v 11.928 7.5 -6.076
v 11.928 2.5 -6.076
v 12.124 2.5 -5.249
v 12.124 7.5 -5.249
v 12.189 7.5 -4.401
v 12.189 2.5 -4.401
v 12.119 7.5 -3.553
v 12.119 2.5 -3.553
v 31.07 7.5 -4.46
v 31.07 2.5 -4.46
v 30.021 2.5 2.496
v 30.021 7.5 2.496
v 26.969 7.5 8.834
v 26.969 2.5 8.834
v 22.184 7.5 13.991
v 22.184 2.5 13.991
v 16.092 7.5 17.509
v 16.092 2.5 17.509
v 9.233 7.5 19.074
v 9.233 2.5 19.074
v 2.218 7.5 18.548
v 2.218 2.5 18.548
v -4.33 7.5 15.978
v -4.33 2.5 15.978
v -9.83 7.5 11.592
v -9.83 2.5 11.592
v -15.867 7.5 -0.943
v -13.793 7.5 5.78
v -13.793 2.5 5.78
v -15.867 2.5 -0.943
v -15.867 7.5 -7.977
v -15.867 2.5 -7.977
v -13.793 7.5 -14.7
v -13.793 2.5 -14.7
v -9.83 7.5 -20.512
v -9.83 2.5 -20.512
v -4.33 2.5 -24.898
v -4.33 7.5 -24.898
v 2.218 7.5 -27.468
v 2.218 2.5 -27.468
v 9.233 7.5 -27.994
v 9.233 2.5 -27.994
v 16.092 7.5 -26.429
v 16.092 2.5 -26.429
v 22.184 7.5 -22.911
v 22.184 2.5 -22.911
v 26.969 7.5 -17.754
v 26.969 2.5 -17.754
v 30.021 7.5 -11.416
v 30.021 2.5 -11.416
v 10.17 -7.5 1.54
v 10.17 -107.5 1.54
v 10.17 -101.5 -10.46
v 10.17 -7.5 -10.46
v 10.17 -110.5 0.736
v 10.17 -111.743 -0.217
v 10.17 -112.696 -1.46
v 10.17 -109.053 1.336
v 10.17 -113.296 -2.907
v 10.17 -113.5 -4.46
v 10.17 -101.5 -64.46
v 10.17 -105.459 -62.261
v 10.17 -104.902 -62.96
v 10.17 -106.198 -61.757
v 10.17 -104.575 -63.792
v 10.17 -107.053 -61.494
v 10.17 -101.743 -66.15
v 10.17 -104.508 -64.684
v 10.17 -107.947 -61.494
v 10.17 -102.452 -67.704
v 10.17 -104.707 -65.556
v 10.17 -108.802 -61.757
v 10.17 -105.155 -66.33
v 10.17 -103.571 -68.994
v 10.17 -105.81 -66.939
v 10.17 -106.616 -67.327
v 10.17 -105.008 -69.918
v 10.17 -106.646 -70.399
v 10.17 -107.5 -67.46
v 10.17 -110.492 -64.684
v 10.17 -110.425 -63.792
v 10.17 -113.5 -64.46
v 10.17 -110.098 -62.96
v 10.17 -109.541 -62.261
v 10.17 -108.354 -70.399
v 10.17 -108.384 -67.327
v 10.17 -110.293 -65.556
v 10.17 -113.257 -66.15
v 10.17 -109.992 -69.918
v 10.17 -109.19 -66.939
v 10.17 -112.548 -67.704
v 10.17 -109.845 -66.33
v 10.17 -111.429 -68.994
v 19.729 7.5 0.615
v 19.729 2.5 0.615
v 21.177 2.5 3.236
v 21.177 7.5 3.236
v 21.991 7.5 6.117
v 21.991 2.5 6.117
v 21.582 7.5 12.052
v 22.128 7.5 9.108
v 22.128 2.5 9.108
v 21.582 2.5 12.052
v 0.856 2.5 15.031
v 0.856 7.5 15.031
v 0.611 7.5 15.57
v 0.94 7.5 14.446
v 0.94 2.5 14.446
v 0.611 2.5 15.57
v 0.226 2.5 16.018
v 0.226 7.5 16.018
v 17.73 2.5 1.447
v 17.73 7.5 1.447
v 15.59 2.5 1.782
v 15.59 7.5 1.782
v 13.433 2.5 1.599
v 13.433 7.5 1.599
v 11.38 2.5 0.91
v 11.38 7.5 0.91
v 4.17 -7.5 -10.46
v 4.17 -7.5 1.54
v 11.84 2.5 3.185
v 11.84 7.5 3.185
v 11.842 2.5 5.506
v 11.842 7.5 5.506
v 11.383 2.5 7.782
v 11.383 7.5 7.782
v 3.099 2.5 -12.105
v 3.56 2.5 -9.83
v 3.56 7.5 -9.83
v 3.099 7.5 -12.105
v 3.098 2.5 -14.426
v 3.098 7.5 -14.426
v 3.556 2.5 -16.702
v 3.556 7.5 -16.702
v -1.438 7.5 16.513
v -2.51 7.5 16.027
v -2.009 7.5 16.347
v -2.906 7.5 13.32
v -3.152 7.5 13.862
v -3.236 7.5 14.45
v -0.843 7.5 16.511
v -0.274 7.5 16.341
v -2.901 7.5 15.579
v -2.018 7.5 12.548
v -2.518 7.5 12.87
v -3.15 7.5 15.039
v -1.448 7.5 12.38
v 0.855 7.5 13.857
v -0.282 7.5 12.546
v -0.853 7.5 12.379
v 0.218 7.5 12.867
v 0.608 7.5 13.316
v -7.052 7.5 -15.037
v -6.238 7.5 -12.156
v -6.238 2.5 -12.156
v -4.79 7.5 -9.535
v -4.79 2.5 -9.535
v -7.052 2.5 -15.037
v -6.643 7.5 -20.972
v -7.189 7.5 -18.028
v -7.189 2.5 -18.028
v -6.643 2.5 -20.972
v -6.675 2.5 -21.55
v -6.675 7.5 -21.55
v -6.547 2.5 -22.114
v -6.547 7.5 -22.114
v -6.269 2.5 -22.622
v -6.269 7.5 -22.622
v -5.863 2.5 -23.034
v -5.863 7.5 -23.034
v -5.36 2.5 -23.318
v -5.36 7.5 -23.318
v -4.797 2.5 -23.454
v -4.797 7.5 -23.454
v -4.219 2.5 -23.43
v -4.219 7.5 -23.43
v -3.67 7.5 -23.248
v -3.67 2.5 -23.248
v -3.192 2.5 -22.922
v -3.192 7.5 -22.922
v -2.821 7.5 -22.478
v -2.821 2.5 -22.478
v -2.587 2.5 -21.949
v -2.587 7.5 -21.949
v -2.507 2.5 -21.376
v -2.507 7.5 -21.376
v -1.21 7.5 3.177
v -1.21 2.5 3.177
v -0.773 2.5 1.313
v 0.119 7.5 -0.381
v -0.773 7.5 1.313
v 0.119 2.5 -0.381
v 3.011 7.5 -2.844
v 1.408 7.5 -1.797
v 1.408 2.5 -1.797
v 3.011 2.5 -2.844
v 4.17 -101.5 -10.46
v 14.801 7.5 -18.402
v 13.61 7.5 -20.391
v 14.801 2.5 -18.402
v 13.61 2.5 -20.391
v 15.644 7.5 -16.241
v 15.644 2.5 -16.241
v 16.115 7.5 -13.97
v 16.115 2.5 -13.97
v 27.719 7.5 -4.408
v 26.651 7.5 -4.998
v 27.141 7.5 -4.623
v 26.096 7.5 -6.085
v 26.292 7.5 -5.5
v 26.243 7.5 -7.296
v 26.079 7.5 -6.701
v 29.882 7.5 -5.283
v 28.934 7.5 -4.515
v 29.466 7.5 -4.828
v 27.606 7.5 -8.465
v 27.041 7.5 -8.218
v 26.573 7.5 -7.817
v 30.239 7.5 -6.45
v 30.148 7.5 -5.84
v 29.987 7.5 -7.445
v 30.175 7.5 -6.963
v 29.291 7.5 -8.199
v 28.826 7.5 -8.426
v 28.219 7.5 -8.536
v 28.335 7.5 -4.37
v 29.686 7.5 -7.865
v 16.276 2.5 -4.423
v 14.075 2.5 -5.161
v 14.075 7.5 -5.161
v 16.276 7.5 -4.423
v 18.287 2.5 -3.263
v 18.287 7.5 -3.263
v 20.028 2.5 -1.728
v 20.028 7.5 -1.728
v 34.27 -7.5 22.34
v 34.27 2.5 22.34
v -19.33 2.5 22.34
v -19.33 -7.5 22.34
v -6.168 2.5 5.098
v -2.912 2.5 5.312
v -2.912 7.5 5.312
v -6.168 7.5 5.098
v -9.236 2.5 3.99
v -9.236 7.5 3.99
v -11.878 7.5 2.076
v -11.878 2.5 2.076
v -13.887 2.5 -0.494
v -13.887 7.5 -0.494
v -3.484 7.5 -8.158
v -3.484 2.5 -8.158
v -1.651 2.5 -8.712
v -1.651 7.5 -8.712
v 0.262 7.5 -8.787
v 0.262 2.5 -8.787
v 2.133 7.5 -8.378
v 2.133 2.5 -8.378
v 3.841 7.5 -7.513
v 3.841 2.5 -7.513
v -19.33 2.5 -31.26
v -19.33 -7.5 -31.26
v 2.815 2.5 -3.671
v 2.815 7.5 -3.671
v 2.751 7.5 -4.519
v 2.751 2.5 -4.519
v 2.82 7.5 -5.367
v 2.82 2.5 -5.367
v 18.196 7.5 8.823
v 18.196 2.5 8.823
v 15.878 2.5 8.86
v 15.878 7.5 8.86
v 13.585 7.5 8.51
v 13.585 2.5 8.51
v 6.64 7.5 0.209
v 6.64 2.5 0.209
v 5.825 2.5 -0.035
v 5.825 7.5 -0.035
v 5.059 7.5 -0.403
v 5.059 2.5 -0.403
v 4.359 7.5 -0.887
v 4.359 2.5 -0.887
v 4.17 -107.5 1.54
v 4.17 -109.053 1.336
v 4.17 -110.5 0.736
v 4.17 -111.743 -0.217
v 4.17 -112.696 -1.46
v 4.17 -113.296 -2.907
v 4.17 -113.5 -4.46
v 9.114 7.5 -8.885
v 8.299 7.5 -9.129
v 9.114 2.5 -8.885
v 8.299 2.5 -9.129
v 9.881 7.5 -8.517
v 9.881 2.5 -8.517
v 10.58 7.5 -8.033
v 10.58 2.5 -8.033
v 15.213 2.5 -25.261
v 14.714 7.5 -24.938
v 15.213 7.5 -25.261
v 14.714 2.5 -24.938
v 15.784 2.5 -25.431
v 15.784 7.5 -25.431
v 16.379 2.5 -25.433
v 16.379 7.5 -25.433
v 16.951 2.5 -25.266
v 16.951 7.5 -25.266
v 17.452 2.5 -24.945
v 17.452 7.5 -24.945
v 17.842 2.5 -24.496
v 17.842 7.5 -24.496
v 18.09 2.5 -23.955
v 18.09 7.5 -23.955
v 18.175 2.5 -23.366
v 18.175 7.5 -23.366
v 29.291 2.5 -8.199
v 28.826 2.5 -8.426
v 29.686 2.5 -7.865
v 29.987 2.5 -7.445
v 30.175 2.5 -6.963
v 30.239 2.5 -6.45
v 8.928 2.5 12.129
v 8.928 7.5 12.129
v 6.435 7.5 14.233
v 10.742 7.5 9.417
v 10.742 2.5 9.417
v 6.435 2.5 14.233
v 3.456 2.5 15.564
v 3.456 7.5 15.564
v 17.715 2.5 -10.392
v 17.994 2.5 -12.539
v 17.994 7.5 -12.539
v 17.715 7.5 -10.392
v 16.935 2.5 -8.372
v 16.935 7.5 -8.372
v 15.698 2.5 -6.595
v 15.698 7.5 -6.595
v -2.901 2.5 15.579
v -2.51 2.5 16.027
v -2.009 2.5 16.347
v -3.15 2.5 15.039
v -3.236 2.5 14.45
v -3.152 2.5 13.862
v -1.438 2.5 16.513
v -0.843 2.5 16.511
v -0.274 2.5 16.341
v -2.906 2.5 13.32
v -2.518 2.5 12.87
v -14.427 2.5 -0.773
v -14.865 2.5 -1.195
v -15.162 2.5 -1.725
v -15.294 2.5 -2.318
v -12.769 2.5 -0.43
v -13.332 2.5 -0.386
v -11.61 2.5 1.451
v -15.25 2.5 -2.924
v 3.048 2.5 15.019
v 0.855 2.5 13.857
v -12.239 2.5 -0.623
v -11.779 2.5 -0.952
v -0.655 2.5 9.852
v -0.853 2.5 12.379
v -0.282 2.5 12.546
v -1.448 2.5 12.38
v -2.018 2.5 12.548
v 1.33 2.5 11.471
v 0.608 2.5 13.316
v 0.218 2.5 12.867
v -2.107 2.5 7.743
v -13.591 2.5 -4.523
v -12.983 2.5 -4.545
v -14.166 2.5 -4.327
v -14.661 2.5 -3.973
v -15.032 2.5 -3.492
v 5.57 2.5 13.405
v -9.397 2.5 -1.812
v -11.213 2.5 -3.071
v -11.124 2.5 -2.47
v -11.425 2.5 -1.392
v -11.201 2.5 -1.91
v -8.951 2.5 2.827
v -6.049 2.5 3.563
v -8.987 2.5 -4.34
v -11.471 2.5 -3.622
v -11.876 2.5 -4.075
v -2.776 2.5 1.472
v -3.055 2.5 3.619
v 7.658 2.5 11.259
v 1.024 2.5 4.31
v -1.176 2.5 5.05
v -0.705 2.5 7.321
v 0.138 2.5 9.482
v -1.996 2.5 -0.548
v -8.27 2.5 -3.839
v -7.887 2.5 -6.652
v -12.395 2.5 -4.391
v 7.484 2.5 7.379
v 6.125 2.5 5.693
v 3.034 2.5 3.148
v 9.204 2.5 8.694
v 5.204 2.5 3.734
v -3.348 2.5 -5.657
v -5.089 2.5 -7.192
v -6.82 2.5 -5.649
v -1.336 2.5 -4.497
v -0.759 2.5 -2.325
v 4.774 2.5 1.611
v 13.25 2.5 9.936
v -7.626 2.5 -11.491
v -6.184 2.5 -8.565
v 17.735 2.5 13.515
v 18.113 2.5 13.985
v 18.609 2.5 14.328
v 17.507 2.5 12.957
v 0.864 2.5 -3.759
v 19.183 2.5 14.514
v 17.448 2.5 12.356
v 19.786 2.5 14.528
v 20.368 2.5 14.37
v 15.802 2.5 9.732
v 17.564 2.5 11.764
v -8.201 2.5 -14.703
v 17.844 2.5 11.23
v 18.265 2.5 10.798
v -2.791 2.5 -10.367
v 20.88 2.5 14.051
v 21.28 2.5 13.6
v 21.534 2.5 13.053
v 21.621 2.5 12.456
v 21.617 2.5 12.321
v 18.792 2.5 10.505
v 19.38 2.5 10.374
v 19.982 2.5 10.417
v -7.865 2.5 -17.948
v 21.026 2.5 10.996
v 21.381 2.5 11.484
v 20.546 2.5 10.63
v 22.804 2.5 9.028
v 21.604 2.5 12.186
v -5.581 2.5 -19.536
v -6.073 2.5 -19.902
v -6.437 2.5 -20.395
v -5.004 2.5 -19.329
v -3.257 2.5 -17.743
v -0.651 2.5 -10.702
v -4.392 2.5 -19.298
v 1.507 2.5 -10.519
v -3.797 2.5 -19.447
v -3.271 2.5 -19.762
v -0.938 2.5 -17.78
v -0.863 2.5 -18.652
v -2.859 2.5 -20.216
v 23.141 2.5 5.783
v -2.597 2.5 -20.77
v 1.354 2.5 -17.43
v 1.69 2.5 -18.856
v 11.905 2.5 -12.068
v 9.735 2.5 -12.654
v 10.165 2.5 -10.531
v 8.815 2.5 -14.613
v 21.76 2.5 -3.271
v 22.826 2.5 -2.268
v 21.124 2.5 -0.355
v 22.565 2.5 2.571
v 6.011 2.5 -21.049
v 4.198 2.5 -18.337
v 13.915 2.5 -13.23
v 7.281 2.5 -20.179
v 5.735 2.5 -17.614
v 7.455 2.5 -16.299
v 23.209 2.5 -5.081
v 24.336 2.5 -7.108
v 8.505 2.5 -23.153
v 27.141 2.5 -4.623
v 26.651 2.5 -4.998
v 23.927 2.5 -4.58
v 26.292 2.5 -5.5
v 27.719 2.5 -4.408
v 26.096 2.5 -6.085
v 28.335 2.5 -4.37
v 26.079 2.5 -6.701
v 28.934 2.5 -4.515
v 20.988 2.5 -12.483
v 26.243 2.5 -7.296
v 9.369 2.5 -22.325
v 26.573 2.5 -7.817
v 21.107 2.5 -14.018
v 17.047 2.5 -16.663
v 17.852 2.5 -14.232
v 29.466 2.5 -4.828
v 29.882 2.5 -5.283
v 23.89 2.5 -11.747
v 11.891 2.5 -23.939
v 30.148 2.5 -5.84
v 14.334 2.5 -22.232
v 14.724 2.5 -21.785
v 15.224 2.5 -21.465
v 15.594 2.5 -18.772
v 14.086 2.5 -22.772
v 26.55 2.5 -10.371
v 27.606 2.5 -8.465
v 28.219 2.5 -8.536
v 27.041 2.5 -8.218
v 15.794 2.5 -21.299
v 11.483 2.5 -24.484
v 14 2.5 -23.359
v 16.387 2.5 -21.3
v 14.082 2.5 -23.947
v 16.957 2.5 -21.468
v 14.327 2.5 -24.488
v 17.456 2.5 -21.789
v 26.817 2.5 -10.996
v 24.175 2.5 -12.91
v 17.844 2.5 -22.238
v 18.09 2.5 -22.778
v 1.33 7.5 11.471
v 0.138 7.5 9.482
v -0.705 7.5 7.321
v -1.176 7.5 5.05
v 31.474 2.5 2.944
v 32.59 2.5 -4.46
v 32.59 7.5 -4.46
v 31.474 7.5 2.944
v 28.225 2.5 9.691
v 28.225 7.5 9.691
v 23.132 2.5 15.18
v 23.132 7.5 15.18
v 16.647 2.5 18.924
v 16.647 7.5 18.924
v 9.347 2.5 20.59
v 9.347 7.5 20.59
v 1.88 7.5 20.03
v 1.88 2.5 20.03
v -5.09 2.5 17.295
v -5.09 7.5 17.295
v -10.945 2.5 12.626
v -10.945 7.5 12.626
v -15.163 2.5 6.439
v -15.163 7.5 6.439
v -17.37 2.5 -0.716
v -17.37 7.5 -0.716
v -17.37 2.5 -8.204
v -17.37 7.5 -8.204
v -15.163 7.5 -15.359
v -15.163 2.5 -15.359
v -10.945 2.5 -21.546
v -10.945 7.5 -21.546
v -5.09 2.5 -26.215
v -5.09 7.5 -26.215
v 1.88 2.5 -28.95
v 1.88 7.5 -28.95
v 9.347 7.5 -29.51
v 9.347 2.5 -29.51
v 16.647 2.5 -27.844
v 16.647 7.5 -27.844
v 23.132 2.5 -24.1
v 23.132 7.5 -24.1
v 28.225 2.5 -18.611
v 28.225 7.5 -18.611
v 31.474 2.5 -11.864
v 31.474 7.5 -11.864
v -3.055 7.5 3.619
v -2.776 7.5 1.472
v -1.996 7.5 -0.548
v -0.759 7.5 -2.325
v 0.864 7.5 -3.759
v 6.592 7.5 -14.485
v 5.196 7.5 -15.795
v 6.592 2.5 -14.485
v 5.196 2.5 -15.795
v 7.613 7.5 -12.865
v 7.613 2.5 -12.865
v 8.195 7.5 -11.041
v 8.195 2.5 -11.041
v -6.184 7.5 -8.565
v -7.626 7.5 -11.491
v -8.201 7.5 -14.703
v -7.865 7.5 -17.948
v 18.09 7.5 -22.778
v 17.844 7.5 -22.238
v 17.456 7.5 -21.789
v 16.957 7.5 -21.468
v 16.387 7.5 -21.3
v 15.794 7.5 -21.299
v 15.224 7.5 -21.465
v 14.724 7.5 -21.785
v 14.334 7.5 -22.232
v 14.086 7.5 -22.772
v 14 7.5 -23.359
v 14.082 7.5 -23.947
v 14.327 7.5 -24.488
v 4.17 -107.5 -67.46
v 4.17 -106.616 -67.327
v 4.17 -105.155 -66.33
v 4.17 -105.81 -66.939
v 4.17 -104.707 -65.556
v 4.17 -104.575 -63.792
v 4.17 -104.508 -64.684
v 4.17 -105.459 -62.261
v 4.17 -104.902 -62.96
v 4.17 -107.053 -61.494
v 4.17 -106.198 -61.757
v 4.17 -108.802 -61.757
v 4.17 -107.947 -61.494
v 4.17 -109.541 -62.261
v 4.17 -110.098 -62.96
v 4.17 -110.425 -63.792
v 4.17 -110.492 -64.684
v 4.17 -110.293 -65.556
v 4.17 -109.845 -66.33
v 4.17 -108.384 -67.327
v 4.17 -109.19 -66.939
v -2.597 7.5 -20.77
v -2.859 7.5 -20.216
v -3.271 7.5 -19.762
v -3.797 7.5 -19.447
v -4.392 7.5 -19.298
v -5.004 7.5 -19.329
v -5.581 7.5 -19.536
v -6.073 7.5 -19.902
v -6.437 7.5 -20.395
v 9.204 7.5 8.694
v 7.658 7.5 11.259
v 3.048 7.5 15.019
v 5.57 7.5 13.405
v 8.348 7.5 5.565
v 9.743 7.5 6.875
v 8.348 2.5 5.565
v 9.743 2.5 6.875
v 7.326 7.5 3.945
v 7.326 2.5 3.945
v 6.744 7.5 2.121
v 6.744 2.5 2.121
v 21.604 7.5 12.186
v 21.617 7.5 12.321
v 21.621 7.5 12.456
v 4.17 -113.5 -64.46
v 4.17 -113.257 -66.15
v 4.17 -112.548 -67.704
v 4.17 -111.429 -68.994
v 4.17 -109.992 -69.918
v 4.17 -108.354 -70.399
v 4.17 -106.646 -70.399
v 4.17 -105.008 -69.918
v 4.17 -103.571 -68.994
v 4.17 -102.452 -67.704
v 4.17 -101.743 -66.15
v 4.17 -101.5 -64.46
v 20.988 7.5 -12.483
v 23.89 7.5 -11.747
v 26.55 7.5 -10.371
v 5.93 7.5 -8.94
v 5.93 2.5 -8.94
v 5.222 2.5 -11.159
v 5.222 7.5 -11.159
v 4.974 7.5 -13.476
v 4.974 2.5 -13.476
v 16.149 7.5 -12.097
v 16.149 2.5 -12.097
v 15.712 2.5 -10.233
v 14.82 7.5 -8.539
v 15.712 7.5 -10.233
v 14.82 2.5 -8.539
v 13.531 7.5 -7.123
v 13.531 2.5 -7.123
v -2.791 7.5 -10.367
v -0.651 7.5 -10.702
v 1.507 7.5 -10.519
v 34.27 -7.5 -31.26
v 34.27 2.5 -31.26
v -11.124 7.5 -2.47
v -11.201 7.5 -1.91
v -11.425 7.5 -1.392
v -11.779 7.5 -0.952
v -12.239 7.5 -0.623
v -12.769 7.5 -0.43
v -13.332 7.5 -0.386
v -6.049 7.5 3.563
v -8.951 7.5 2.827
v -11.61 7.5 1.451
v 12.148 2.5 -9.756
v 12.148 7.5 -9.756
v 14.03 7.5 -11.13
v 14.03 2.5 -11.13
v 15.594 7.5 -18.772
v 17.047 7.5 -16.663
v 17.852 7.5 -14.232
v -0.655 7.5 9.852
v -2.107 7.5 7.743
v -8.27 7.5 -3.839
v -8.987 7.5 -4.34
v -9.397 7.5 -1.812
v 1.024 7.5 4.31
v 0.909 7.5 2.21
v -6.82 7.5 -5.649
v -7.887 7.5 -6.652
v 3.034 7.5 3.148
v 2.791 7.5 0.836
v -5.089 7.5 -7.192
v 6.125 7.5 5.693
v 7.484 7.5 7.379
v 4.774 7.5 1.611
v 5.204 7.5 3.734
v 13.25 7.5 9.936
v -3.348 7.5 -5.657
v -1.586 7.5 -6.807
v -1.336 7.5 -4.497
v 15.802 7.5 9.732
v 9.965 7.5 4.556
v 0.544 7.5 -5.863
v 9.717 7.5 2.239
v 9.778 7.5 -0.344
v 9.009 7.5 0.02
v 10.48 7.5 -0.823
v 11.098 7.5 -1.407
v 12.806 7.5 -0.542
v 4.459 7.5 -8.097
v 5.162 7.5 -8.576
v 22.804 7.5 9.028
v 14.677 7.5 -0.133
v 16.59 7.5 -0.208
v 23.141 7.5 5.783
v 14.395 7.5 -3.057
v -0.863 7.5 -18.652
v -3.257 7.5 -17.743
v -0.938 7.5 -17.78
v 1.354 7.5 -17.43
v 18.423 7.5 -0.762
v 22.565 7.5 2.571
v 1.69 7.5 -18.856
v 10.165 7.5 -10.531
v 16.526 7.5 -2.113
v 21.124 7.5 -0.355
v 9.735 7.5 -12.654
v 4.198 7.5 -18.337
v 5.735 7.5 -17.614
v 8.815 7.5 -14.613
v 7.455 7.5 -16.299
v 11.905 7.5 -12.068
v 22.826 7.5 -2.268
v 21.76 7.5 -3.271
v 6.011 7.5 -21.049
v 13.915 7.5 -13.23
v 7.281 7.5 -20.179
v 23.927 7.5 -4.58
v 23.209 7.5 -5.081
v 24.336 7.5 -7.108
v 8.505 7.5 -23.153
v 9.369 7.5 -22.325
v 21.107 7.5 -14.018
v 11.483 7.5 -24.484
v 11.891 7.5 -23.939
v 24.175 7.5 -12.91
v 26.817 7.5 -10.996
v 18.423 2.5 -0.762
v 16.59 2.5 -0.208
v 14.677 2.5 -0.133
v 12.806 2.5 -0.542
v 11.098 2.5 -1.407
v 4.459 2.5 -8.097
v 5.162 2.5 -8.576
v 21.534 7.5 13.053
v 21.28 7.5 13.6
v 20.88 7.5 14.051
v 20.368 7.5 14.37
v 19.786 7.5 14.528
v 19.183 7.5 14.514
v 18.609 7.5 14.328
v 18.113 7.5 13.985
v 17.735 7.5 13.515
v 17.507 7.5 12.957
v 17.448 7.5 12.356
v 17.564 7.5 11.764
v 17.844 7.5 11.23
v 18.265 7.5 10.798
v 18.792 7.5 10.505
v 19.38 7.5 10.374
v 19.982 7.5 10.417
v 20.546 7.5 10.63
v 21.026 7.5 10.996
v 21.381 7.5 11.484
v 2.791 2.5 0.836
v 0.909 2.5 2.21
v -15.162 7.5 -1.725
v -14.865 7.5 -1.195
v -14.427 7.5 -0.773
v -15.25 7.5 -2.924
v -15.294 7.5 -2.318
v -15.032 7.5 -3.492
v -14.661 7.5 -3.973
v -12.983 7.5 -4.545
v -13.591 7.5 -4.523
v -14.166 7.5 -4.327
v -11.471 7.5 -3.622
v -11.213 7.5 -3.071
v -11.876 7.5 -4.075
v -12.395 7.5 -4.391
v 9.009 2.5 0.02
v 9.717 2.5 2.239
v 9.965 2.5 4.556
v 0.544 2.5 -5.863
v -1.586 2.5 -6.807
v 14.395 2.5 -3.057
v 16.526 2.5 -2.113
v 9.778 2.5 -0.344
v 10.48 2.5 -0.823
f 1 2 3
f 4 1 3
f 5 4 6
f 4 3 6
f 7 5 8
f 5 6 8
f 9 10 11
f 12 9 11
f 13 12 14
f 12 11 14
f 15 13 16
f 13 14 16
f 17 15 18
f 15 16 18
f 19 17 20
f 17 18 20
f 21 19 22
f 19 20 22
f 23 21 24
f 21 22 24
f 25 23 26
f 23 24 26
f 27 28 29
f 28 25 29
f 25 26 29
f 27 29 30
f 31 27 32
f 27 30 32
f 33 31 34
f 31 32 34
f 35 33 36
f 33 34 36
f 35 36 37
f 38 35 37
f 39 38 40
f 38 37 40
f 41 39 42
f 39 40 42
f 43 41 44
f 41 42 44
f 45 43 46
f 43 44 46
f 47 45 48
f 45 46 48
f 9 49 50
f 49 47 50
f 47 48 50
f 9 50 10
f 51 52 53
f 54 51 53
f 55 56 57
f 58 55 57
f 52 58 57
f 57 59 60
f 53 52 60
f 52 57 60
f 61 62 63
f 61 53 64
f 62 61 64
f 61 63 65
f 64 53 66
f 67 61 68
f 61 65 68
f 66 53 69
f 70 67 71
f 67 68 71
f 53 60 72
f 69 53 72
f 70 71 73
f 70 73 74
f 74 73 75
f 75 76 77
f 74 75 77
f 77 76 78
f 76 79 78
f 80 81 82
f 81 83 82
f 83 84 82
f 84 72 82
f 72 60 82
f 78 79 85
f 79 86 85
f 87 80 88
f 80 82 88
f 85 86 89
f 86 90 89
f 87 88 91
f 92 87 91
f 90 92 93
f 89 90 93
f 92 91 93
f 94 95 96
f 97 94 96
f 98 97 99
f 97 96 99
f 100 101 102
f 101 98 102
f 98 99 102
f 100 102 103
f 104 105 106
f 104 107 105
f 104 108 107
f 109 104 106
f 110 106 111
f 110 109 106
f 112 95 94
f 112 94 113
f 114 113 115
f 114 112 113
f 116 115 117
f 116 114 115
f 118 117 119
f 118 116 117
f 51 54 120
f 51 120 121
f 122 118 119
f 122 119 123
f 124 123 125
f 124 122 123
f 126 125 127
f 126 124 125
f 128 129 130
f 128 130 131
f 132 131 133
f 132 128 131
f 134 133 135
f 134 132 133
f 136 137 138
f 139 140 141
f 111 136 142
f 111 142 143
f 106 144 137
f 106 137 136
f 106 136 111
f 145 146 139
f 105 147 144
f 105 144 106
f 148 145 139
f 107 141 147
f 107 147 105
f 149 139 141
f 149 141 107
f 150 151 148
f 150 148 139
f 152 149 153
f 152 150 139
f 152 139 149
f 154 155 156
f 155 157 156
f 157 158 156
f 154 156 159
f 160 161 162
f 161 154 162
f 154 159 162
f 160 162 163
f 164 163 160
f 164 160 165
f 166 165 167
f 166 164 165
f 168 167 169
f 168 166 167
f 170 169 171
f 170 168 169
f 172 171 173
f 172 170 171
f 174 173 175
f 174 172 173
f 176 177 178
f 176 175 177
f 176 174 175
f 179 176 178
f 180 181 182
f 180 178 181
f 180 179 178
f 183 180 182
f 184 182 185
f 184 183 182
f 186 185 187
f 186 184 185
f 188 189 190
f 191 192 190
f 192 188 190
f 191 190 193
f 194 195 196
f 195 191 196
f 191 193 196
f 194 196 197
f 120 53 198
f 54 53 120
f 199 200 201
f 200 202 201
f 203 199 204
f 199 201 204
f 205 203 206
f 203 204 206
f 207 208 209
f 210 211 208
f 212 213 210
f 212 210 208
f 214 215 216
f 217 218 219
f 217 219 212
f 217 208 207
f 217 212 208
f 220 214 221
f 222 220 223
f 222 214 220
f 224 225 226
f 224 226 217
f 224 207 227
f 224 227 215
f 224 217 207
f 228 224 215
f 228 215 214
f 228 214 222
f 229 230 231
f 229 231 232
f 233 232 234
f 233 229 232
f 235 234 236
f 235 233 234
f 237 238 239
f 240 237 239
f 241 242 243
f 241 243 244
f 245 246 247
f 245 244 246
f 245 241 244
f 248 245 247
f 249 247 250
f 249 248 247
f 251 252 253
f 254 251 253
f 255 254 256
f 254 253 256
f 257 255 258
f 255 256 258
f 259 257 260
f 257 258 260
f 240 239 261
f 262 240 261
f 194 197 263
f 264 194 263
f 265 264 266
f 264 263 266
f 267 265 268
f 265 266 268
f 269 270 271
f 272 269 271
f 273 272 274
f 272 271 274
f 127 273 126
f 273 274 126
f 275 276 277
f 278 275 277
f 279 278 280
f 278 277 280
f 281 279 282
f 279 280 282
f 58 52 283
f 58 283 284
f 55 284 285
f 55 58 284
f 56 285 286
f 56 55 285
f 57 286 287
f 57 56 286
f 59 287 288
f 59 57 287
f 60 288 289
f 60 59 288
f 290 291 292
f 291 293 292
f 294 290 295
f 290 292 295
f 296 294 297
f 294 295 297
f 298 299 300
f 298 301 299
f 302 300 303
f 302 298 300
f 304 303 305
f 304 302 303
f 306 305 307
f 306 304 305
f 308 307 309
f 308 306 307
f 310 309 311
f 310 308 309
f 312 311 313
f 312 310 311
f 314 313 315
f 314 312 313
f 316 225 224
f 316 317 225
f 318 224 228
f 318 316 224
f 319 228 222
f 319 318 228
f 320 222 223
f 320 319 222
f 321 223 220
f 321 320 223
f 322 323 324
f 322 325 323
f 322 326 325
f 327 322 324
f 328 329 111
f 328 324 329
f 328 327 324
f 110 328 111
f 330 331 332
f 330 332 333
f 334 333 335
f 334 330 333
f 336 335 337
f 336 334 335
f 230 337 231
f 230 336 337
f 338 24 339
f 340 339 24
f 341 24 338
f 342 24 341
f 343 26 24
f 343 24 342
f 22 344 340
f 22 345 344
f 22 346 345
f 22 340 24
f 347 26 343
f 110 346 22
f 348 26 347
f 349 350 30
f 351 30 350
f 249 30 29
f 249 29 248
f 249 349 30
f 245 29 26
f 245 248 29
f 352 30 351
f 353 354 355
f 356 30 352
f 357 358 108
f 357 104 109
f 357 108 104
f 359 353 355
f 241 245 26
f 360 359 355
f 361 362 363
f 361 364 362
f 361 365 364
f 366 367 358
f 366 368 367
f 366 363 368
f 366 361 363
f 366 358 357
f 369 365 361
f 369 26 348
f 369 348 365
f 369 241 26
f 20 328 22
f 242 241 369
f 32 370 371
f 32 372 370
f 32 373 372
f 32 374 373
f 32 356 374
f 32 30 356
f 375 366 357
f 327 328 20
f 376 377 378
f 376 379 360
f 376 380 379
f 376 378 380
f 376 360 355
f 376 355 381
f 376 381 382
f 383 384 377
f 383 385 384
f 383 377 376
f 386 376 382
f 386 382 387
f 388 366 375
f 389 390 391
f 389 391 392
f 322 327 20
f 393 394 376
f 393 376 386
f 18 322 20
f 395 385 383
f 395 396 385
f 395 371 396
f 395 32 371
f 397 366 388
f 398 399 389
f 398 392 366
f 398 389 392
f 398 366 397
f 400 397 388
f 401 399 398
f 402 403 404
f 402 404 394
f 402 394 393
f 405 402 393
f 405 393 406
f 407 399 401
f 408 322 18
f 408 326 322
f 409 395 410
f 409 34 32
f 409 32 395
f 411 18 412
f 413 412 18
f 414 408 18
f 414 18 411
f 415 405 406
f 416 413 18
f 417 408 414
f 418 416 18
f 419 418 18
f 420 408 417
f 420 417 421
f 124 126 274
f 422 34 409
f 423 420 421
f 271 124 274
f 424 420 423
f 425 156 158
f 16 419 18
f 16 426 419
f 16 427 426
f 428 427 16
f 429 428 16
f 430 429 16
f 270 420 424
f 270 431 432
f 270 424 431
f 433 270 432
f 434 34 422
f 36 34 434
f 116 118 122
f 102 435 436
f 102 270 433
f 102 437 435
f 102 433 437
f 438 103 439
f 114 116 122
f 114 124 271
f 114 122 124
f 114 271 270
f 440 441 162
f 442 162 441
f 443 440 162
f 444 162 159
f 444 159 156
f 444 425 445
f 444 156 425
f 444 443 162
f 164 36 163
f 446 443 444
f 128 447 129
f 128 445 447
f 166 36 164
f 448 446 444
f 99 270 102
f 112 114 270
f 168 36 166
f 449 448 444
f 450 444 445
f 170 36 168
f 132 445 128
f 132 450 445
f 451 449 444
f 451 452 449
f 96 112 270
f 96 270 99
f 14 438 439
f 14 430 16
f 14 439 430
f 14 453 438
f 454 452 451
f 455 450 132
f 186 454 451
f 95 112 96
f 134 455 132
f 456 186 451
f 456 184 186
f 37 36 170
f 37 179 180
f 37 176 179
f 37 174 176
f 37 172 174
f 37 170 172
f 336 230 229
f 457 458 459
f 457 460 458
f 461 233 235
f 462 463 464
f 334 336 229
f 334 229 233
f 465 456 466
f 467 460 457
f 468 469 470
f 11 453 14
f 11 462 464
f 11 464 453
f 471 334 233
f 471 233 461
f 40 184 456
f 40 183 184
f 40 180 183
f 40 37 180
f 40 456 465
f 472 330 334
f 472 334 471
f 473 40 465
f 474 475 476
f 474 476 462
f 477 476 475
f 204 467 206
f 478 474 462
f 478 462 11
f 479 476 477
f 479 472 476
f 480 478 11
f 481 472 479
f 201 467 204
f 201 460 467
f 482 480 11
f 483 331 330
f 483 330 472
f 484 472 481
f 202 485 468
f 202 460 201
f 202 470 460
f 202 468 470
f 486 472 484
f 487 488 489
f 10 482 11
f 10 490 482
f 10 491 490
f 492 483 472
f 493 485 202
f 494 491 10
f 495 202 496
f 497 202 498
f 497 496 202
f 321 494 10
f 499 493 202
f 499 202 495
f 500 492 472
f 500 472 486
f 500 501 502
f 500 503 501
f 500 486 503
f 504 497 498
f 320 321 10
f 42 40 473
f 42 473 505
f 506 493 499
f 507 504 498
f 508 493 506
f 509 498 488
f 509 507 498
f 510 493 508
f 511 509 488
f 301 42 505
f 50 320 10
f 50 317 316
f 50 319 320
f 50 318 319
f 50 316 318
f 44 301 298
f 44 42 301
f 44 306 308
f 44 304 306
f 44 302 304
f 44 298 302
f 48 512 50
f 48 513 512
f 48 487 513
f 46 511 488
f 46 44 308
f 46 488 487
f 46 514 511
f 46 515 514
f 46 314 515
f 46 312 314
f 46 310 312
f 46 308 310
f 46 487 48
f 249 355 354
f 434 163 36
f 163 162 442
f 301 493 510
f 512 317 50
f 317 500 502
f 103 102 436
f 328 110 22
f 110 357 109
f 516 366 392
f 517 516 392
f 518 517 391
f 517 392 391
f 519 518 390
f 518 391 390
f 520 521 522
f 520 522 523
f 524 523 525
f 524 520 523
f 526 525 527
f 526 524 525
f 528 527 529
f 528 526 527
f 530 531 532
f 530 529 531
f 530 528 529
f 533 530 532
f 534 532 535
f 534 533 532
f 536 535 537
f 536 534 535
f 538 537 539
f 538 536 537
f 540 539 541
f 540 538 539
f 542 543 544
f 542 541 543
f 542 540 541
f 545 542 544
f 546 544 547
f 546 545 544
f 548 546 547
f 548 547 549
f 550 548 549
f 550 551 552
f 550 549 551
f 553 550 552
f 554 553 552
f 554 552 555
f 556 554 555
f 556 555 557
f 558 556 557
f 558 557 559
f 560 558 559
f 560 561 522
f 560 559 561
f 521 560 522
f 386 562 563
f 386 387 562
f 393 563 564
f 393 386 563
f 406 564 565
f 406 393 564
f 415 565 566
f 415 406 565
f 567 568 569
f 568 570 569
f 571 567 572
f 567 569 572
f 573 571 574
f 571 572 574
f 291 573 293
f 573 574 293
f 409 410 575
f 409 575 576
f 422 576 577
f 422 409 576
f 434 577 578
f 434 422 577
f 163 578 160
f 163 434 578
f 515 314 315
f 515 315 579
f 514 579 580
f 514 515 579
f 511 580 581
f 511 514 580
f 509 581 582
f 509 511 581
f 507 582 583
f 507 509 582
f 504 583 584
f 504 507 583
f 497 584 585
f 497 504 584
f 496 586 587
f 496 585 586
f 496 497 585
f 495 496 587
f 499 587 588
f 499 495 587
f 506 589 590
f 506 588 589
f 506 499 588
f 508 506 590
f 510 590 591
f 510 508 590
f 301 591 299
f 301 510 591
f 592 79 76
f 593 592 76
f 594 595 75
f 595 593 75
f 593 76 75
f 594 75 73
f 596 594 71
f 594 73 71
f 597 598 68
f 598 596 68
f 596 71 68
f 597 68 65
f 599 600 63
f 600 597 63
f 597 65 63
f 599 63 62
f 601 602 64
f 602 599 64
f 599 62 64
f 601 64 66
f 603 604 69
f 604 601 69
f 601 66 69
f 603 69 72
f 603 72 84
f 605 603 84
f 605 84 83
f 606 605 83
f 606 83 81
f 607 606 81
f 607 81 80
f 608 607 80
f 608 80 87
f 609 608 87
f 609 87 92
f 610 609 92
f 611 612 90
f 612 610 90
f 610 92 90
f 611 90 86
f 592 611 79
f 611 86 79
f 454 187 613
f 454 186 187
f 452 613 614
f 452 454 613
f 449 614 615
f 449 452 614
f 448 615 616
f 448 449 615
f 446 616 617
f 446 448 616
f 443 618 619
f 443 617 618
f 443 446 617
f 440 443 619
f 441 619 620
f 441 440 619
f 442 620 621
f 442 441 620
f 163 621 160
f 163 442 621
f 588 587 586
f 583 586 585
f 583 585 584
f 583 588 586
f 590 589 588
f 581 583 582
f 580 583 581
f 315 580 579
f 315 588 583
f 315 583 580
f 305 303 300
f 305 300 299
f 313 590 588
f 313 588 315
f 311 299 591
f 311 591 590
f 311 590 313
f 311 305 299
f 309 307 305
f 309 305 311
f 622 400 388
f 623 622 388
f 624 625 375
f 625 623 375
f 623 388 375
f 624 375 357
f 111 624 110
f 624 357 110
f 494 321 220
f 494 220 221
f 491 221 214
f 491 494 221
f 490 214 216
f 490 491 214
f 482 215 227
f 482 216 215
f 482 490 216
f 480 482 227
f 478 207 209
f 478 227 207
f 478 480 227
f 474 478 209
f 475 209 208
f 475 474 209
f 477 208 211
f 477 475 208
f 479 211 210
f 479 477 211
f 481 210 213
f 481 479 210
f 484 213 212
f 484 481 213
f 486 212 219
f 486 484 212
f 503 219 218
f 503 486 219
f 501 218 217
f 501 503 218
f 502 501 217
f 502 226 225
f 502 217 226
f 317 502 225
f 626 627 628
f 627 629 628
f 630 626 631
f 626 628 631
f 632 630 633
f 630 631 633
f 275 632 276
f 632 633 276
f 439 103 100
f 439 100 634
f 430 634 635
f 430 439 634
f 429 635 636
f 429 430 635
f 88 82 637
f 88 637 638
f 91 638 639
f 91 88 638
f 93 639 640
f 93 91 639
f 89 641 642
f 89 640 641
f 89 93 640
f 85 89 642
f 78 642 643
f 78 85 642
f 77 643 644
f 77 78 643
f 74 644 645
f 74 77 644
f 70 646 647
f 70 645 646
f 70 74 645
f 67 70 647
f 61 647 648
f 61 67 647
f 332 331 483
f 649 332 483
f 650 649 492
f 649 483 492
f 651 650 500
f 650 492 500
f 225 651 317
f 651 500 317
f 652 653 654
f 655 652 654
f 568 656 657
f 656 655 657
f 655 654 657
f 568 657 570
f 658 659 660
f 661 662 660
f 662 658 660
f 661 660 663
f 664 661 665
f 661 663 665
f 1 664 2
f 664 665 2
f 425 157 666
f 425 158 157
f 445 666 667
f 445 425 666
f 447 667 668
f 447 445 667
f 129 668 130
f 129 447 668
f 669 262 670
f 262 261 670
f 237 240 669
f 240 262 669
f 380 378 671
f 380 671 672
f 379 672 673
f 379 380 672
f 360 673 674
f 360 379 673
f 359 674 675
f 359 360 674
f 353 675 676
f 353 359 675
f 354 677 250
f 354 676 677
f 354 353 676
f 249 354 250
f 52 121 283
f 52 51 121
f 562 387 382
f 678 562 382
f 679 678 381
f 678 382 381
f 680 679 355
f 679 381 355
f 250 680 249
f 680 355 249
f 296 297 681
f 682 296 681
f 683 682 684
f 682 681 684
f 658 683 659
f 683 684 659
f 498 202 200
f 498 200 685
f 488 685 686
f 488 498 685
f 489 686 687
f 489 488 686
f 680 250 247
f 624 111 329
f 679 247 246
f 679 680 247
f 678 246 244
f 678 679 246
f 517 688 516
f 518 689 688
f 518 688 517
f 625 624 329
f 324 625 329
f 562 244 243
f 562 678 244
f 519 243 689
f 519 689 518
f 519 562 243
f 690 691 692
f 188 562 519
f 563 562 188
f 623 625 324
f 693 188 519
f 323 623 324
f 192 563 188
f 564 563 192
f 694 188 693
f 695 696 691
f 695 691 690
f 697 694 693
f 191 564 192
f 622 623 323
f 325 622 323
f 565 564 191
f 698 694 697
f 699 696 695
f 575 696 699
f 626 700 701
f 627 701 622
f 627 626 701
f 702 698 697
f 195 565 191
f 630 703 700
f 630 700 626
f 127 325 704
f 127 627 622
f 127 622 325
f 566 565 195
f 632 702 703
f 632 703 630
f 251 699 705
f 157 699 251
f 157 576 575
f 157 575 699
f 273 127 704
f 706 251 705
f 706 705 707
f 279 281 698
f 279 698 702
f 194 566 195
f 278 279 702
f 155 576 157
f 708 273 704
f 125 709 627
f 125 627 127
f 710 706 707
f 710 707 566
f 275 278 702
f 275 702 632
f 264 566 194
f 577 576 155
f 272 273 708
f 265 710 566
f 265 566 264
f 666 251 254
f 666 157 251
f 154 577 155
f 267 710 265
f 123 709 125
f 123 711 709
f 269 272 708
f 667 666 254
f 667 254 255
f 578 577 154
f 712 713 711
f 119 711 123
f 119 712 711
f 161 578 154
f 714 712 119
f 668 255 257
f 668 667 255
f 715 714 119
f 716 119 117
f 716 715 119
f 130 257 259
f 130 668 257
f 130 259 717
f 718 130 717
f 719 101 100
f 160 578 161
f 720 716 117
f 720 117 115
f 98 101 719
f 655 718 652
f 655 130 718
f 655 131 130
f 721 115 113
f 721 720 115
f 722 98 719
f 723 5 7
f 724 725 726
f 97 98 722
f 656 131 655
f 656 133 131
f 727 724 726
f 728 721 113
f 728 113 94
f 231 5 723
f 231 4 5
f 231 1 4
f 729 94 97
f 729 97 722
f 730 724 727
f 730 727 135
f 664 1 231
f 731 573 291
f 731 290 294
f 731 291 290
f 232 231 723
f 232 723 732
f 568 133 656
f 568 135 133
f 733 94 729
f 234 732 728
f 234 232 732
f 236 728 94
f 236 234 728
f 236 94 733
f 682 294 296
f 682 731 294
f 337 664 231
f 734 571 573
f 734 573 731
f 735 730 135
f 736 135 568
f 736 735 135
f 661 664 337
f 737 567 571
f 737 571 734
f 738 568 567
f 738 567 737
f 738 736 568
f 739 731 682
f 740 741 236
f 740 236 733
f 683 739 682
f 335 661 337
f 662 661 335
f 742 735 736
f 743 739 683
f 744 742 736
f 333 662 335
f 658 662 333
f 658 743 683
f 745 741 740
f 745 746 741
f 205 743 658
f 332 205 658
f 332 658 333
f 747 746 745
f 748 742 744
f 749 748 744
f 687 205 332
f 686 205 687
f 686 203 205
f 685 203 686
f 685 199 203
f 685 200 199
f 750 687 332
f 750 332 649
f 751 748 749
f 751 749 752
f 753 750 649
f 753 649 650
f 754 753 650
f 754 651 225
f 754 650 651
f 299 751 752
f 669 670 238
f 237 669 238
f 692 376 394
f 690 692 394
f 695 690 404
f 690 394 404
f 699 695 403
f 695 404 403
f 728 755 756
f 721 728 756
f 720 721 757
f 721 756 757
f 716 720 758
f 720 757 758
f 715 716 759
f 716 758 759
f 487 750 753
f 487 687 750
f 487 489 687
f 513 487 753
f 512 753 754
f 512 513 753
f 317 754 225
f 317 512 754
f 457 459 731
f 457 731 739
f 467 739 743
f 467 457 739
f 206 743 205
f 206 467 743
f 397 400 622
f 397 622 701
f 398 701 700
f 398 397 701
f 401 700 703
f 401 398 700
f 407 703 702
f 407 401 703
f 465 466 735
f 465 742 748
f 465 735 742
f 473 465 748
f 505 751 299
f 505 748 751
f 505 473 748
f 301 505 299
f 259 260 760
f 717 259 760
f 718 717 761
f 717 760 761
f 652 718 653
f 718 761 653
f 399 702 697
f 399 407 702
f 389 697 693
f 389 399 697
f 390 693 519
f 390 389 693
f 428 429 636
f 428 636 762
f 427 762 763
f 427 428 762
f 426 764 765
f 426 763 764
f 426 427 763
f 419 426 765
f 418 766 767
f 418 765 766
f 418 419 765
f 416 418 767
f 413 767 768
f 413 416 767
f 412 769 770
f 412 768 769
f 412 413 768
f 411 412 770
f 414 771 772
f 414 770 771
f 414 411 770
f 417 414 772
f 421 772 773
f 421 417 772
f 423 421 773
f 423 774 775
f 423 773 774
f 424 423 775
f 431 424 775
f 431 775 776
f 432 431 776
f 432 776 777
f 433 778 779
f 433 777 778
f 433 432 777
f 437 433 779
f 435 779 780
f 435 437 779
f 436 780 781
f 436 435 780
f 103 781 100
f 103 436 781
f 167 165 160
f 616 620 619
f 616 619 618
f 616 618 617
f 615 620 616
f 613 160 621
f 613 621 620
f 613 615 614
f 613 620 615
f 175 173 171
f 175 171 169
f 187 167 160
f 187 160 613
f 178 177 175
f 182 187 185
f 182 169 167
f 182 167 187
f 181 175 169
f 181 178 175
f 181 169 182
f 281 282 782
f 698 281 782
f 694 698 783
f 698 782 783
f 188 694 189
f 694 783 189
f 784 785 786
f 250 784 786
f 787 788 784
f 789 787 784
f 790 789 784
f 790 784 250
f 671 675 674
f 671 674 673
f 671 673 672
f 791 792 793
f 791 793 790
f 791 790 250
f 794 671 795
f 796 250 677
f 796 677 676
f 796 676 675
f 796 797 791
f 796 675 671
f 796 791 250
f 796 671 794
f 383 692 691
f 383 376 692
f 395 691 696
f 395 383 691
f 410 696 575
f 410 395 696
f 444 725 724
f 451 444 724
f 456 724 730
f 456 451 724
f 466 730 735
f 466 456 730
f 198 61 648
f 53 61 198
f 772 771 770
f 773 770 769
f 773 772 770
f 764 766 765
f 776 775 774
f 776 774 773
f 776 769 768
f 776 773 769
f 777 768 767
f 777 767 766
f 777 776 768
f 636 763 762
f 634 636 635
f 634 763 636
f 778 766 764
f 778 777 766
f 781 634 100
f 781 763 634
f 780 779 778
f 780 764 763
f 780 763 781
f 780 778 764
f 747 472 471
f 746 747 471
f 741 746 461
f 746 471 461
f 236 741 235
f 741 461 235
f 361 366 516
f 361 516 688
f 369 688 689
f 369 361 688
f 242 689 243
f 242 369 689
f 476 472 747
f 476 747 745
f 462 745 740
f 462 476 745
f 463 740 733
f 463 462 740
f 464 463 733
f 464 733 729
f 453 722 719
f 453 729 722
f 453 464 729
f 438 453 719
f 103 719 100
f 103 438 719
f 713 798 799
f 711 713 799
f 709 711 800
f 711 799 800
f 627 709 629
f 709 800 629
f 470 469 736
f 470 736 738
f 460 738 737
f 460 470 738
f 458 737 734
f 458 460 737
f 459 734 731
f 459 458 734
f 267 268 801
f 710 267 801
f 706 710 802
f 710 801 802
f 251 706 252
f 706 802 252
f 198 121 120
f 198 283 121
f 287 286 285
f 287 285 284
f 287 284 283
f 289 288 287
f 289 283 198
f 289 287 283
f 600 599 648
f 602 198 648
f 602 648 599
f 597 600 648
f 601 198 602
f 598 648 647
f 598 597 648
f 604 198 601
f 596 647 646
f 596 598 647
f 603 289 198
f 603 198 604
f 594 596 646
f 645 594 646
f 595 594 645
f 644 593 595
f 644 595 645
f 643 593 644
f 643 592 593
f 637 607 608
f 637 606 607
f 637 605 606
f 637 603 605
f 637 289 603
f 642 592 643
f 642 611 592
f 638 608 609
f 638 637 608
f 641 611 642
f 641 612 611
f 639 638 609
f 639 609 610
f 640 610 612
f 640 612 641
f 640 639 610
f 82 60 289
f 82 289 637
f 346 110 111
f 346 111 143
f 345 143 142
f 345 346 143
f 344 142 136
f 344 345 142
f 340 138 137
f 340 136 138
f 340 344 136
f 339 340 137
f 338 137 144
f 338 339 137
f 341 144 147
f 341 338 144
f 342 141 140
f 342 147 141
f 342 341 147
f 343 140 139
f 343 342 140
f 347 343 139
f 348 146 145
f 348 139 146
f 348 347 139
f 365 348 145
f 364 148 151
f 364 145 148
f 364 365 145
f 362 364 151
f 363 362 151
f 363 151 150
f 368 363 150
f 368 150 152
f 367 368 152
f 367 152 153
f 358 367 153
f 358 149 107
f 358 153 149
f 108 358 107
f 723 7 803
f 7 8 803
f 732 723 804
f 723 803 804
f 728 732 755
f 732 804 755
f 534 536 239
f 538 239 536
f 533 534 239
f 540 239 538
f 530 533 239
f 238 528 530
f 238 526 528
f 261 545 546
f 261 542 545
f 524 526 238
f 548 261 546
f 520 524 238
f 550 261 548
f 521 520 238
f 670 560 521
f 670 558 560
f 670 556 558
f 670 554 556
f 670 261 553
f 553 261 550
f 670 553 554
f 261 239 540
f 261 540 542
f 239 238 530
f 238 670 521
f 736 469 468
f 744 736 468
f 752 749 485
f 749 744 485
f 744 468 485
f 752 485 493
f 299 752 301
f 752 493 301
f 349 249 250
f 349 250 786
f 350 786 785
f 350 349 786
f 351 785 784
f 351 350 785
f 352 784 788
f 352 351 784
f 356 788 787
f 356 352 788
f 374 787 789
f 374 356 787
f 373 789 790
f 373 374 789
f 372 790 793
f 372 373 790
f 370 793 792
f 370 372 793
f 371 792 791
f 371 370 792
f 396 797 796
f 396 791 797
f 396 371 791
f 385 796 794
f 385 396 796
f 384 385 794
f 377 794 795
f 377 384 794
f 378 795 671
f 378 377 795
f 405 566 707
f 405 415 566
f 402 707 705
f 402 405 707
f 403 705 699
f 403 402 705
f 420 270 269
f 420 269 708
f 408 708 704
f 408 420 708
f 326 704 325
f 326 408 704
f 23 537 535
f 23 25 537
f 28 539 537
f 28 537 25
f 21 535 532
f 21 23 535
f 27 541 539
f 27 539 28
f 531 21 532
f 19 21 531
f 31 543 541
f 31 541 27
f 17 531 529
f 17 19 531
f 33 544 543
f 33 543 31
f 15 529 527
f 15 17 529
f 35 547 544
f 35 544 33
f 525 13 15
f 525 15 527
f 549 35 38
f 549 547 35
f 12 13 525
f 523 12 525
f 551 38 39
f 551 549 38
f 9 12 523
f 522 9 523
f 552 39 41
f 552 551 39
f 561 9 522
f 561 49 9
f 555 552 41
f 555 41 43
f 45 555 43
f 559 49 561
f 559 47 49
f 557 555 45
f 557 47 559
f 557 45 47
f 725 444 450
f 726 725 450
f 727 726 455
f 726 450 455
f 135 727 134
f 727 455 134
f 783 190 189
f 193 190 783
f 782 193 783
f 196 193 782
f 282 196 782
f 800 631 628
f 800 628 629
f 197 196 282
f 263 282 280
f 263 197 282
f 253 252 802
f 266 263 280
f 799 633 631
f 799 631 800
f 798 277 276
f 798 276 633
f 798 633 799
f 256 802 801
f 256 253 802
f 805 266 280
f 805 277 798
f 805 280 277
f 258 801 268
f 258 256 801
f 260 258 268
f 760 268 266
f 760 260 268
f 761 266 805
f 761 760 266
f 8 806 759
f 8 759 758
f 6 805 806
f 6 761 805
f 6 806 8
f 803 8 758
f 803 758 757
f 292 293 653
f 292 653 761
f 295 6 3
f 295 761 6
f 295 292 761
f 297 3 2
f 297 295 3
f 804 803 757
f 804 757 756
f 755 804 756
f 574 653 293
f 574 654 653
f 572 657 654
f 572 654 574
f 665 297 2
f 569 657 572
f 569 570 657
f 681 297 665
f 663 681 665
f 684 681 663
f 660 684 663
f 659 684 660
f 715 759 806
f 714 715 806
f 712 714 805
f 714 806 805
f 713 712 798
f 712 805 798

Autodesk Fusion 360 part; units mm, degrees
sketch "Sketch1" plane through (0, 0, 0) normal (0, 1, 0) x (1, 0, 0)
  arc A0 (0.3848, -1.12) -> (0.9072, -0.7632) centre (-0.0957, 0.1445) ccw
  arc A1 (3.1397, -0.683) -> (4.2167, 0.662) centre (1.059, 2.0869) ccw
  arc A2 (0.9072, -0.7632) -> (2.7383, -0.9246) centre (1.9676, 0.8001) ccw
  arc A3 (3.0458, -0.7511) -> (3.0474, -0.7499) centre (2.7604, -0.3405) ccw
  arc A4 (-1.811, -5.1195) -> (0.4336, -3.2886) centre (-2.5419, -1.932) ccw
  arc A5 (3.5281, -4.1281) -> (3.0649, -1.2688) centre (0.4022, -3.1674) ccw
  arc A6 (1.1624, -0.2268) -> (1.1146, 0.4041) centre (-0.173, -0.0107) ccw
  arc A7 (1.1146, 0.4041) -> (2.1699, 1.9092) centre (0.2909, 2.1041) ccw
  arc A8 (5.3391, 0.9914) -> (2.6312, 2.0198) centre (2.9441, -1.2354) ccw
  arc A9 (0.7776, 0.8933) -> (0.2074, 1.1673) centre (-0.0773, -0.1552) ccw
  arc A10 (0.2074, 1.1673) -> (-0.5684, 2.8338) centre (-1.6767, 1.304) ccw
  arc A11 (-0.9784, 3.0605) -> (-2.6817, 3.3207) centre (-2.3368, -0.1263) ccw
  arc A12 (1.811, 5.1195) -> (-0.4336, 3.2886) centre (2.5419, 1.932) ccw
  arc A13 (-0.3848, 1.12) -> (-0.9072, 0.7632) centre (0.0957, -0.1445) ccw
  arc A14 (-0.9072, 0.7632) -> (-2.7383, 0.9246) centre (-1.9676, -0.8001) ccw
  arc A15 (-3.1397, 0.683) -> (-4.2167, -0.662) centre (-1.059, -2.0869) ccw
  arc A16 (-3.5281, 4.1281) -> (-3.0649, 1.2688) centre (-0.4022, 3.1674) ccw
  arc A17 (-1.1624, 0.2268) -> (-1.1146, -0.4041) centre (0.173, 0.0107) ccw
  arc A18 (-1.1146, -0.4041) -> (-2.1699, -1.9092) centre (-0.2909, -2.1041) ccw
  arc A19 (-2.1613, -2.3776) -> (-1.535, -3.9828) centre (1.2778, -1.9605) ccw
  arc A20 (-5.3391, -0.9914) -> (-2.6312, -2.0198) centre (-2.9441, 1.2354) ccw
  arc A21 (-0.7776, -0.8933) -> (-0.2074, -1.1673) centre (0.0773, 0.1552) ccw
  arc A22 (-0.2074, -1.1673) -> (0.5684, -2.8338) centre (1.6767, -1.304) ccw
  arc A23 (0.9784, -3.0605) -> (2.6817, -3.3207) centre (2.3368, 0.1263) ccw
  arc A24 (0.5684, -2.8338) -> (0.3848, -1.12) centre (-2.2605, -2.2702) ccw
  arc A25 (-2.1699, -1.9092) -> (-0.7776, -0.8933) centre (-3.0963, 0.8225) ccw
  arc A26 (-2.7383, 0.9246) -> (-1.1624, 0.2268) centre (-0.8358, 3.0927) ccw
  arc A27 (-0.5684, 2.8338) -> (-0.3848, 1.12) centre (2.2605, 2.2702) ccw
  arc A28 (2.1699, 1.9092) -> (0.7776, 0.8933) centre (3.0963, -0.8225) ccw
  arc A29 (2.7383, -0.9246) -> (1.1624, -0.2268) centre (0.8358, -3.0927) ccw
  line L0 (6.7, -6.7) -> (-6.7, -6.7)
  line L1 (-6.7, -6.7) -> (-6.7, 6.7)
  line L2 (-6.7, 6.7) -> (6.7, 6.7)
  line L3 (6.7, 6.7) -> (6.7, -6.7)
  arc A30 (-0.6739, -1.5178) -> (0.4336, -3.2886) centre (1.5858, -1.3364) ccw
  arc A31 (0.818, -3.4693) -> (2.6817, -3.3207) centre (1.5858, -1.3364) ccw
  arc A32 (-1.811, -5.1195) -> (0.818, -3.4693) centre (-1.8093, -2.2029) ccw
  arc A33 (0.9784, -3.0605) -> (0.9775, -1.3425) centre (-1.8093, -2.2029) ccw
  arc A34 (0.9775, -1.3425) -> (3.0649, -1.2688) centre (1.9502, 0.7051) ccw
  arc A35 (3.4135, -1.0262) -> (4.2167, 0.662) centre (1.9502, 0.7051) ccw
  arc A36 (3.1397, -0.683) -> (1.6513, 0.1753) centre (1.0032, -2.6683) ccw
  arc A37 (3.5281, -4.1281) -> (3.4135, -1.0262) centre (1.0032, -2.6683) ccw
  arc A38 (1.6513, 0.1753) -> (2.6312, 2.0198) centre (0.3645, 2.0415) ccw
  arc A39 (2.5955, 2.4431) -> (1.535, 3.9828) centre (0.3645, 2.0415) ccw
  arc A40 (2.1613, 2.3776) -> (0.6739, 1.5178) centre (2.8124, -0.4654) ccw
  arc A41 (5.3391, 0.9914) -> (2.5955, 2.4431) centre (2.8124, -0.4654) ccw
  arc A42 (0.6739, 1.5178) -> (-0.4336, 3.2886) centre (-1.5858, 1.3364) ccw
  arc A43 (-0.818, 3.4693) -> (-2.6817, 3.3207) centre (-1.5858, 1.3364) ccw
  arc A44 (-0.9784, 3.0605) -> (-0.9775, 1.3425) centre (1.8093, 2.2029) ccw
  arc A45 (1.811, 5.1195) -> (-0.818, 3.4693) centre (1.8093, 2.2029) ccw
  arc A46 (-0.9775, 1.3425) -> (-3.0649, 1.2688) centre (-1.9502, -0.7051) ccw
  arc A47 (-3.4135, 1.0262) -> (-4.2167, -0.662) centre (-1.9502, -0.7051) ccw
  arc A48 (-3.1397, 0.683) -> (-1.6513, -0.1753) centre (-1.0032, 2.6683) ccw
  arc A49 (-3.5281, 4.1281) -> (-3.4135, 1.0262) centre (-1.0032, 2.6683) ccw
  arc A50 (-1.6513, -0.1753) -> (-2.6312, -2.0198) centre (-0.3645, -2.0415) ccw
  arc A51 (-2.5955, -2.4431) -> (-1.535, -3.9828) centre (-0.3645, -2.0415) ccw
  arc A52 (-2.1613, -2.3776) -> (-0.6739, -1.5178) centre (-2.8124, 0.4654) ccw
  arc A53 (-5.3391, -0.9914) -> (-2.5955, -2.4431) centre (-2.8124, 0.4654) ccw
  arc A54 (2.1613, 2.3776) -> (1.535, 3.9828) centre (-1.2778, 1.9605) ccw
  circle A55 centre (3.016, -4.229) radius 0.5219
  circle A56 centre (5.1704, 0.4975) radius 0.5219
  circle A57 centre (2.1544, 4.7264) radius 0.5219
  circle A58 centre (-3.016, 4.229) radius 0.5219
  circle A59 centre (-5.1704, -0.4975) radius 0.5219
  circle A60 centre (-2.1544, -4.7264) radius 0.5219
  circle A61 centre (0, 0) radius 5.9
  circle A62 centre (0, 0) radius 6.28
  dimension "d1" = 0.5
  dimension "d9" = 13.4
  dimension "d10" = 13.4
  dimension "d15" = 6.7
  dimension "d23" = 360
  dimension "d25" = 11.8
  dimension "d26" = 12.56
  dimension "d27" = 6.7
extrude "Extrude1" add sketch "Sketch1" along normal blind 1.25 contours A0 A1 A2 A3 A4 A5 A6 A7 A8 A9 A10 A11 A12 A13 A14 A15 A16 A17 A18 A19 A20 A21 A22 A23 A24 A25 A26 A27 A28 A29 A30 A31 A32 A33 A34 A35 A36 A37 A38 A39 A40 A41 A42 A43 A44 A45 A46 A47 A48 A49 A50 A51 A52 A53 A54 | A3 A29 A36 | A55 | A60 | A59 | A58 | A57 | A56 | A62 makes body 1 at (-2.3208, 0, 2.1022) makes body 2 at (6.2722, 0.8333, 0.313)
extrude "Extrude2" add sketch "Sketch1" against normal blind 2.5 contours A0 A2 A3 A6 A7 A9 A10 A13 A14 A17 A18 A21 A22 A24 A25 A26 A27 A28 A29 | A0 A1 A2 A3 A4 A5 A6 A7 A8 A9 A10 A11 A12 A13 A14 A15 A16 A17 A18 A19 A20 A21 A22 A23 A24 A25 A26 A27 A28 A29 A30 A31 A32 A33 A34 A35 A36 A37 A38 A39 A40 A41 A42 A43 A44 A45 A46 A47 A48 A49 A50 A51 A52 A53 A54 | A3 A29 A36 | A3 A29 | A3 A36 | A55 | A60 | A59 | A58 | A57 | A56 | L0 L1 L2 L3 | A61 | A62 bodies 2 1
scale "Scale1" factor 2 about (-6.7, -2.5, 6.7) bodies 2
scale "Scale2" factor 2 about (5.9304, 2.5, -8.94) bodies 2
sketch "Sketch2" plane through (0, 2.5, 0) normal (0, 1, 0) x (-1, 0, 0)
  arc A0 (-18.4229, -0.7616) -> (-12.1191, -3.5529) centre (-10.8129, 7.911) ccw
  arc A1 (-12.1191, -3.5529) -> (-11.928, -6.0762) centre (-6.7775, -4.4173) ccw
  arc A2 (-11.928, -6.0762) -> (-16.1492, -12.0967) centre (-8.6334, -12.8762) ccw
  arc A3 (-16.1492, -12.0967) -> (-10.5798, -8.033) centre (-19.8548, -1.1699) ccw
  arc A4 (-10.5798, -8.033) -> (-8.2991, -9.1292) centre (-7.1605, -3.8393) ccw
  arc A5 (-8.2991, -9.1292) -> (-5.1958, -15.795) centre (-0.7628, -9.676) ccw
  arc A6 (-5.1958, -15.795) -> (-5.9304, -8.94) centre (-16.5115, -13.5408) ccw
  arc A7 (-5.9304, -8.94) -> (-3.8407, -7.5129) centre (-7.8526, -3.8819) ccw
  arc A8 (-3.8407, -7.5129) -> (3.4837, -8.1583) centre (0.401, -1.2597) ccw
  arc A9 (3.4837, -8.1583) -> (-2.8202, -5.367) centre (-4.1263, -16.8309) ccw
  arc A10 (-2.8202, -5.367) -> (-3.0112, -2.8437) centre (-8.1617, -4.5026) ccw
  arc A11 (-3.0112, -2.8437) -> (1.2099, 3.1767) centre (-6.3058, 3.9563) ccw
  arc A12 (1.2099, 3.1767) -> (-4.3594, -0.8869) centre (4.9156, -7.7501) ccw
  arc A13 (-4.3594, -0.8869) -> (-6.6401, 0.2092) centre (-7.7787, -5.0806) ccw
  arc A14 (-6.6401, 0.2092) -> (-9.7434, 6.8751) centre (-14.1764, 0.756) ccw
  arc A15 (-9.7434, 6.8751) -> (-9.0088, 0.0201) centre (1.5723, 4.6208) ccw
  arc A16 (-9.0088, 0.0201) -> (-11.0985, -1.407) centre (-7.0866, -5.038) ccw
  arc A17 (-11.0985, -1.407) -> (-18.4229, -0.7616) centre (-15.3402, -7.6602) ccw
sketch "Sketch3" plane through (0, -7.5, 0) normal (0, -1, 0) x (1, 0, 0)
  line L0 (-19.3304, -31.26) -> (34.2696, -31.26)
  line L1 (34.2696, -31.26) -> (34.2696, 22.34)
  line L2 (34.2696, 22.34) -> (-19.3304, 22.34)
  line L3 (-19.3304, 22.34) -> (-19.3304, -31.26)
  line L4 (10.4696, 10.54) -> (4.4696, 10.54)
  line L5 (4.4696, 10.54) -> (4.4696, -19.46)
  line L6 (4.4696, -19.46) -> (10.4696, -19.46)
  line L7 (10.4696, -19.46) -> (10.4696, 10.54)
  point P0 (7.4696, -4.46)
  dimension "d28" = 6
  dimension "d29" = 30
ref_plane "WorkPlane1" through (7.1696, -2.5, -4.46) normal (-1, 0, 0) x (0, 0, -1)
sketch "Sketch4" plane through (7.1696, -2.5, -4.46) normal (-1, 0, 0) x (0, 0, -1)
  line L0 (-26.8, -5) -> (26.8, -5)
  line L1 (26.8, -5) -> (26.8, 5)
  line L2 (26.8, 5) -> (-26.8, 5)
  line L3 (-26.8, 5) -> (-26.8, -5)
  line L4 (0, 5) -> (-6, 5)
  line L5 (-6, 5) -> (-6, 105)
  line L6 (6, 99) -> (6, 5)
  arc A0 (0, 111) -> (-6, 105) centre (0, 105) ccw
  line L7 (0, 111) -> (60, 111)
  line L8 (60, 99) -> (6, 99)
  circle A1 centre (60, 105) radius 3
  arc A2 (60, 99) -> (60, 111) centre (60, 105) ccw
  dimension "d31" = 6
  dimension "d32" = 100
  dimension "d37" = 60
  dimension "d38" = 12
  dimension "d39" = 12
  dimension "d40" = 6
extrude "Extrude3" add sketch "Sketch4" along normal mid plane 6 separate body contours L2 L4 L5 L6 A0 L7 L8 A2 makes body 3
